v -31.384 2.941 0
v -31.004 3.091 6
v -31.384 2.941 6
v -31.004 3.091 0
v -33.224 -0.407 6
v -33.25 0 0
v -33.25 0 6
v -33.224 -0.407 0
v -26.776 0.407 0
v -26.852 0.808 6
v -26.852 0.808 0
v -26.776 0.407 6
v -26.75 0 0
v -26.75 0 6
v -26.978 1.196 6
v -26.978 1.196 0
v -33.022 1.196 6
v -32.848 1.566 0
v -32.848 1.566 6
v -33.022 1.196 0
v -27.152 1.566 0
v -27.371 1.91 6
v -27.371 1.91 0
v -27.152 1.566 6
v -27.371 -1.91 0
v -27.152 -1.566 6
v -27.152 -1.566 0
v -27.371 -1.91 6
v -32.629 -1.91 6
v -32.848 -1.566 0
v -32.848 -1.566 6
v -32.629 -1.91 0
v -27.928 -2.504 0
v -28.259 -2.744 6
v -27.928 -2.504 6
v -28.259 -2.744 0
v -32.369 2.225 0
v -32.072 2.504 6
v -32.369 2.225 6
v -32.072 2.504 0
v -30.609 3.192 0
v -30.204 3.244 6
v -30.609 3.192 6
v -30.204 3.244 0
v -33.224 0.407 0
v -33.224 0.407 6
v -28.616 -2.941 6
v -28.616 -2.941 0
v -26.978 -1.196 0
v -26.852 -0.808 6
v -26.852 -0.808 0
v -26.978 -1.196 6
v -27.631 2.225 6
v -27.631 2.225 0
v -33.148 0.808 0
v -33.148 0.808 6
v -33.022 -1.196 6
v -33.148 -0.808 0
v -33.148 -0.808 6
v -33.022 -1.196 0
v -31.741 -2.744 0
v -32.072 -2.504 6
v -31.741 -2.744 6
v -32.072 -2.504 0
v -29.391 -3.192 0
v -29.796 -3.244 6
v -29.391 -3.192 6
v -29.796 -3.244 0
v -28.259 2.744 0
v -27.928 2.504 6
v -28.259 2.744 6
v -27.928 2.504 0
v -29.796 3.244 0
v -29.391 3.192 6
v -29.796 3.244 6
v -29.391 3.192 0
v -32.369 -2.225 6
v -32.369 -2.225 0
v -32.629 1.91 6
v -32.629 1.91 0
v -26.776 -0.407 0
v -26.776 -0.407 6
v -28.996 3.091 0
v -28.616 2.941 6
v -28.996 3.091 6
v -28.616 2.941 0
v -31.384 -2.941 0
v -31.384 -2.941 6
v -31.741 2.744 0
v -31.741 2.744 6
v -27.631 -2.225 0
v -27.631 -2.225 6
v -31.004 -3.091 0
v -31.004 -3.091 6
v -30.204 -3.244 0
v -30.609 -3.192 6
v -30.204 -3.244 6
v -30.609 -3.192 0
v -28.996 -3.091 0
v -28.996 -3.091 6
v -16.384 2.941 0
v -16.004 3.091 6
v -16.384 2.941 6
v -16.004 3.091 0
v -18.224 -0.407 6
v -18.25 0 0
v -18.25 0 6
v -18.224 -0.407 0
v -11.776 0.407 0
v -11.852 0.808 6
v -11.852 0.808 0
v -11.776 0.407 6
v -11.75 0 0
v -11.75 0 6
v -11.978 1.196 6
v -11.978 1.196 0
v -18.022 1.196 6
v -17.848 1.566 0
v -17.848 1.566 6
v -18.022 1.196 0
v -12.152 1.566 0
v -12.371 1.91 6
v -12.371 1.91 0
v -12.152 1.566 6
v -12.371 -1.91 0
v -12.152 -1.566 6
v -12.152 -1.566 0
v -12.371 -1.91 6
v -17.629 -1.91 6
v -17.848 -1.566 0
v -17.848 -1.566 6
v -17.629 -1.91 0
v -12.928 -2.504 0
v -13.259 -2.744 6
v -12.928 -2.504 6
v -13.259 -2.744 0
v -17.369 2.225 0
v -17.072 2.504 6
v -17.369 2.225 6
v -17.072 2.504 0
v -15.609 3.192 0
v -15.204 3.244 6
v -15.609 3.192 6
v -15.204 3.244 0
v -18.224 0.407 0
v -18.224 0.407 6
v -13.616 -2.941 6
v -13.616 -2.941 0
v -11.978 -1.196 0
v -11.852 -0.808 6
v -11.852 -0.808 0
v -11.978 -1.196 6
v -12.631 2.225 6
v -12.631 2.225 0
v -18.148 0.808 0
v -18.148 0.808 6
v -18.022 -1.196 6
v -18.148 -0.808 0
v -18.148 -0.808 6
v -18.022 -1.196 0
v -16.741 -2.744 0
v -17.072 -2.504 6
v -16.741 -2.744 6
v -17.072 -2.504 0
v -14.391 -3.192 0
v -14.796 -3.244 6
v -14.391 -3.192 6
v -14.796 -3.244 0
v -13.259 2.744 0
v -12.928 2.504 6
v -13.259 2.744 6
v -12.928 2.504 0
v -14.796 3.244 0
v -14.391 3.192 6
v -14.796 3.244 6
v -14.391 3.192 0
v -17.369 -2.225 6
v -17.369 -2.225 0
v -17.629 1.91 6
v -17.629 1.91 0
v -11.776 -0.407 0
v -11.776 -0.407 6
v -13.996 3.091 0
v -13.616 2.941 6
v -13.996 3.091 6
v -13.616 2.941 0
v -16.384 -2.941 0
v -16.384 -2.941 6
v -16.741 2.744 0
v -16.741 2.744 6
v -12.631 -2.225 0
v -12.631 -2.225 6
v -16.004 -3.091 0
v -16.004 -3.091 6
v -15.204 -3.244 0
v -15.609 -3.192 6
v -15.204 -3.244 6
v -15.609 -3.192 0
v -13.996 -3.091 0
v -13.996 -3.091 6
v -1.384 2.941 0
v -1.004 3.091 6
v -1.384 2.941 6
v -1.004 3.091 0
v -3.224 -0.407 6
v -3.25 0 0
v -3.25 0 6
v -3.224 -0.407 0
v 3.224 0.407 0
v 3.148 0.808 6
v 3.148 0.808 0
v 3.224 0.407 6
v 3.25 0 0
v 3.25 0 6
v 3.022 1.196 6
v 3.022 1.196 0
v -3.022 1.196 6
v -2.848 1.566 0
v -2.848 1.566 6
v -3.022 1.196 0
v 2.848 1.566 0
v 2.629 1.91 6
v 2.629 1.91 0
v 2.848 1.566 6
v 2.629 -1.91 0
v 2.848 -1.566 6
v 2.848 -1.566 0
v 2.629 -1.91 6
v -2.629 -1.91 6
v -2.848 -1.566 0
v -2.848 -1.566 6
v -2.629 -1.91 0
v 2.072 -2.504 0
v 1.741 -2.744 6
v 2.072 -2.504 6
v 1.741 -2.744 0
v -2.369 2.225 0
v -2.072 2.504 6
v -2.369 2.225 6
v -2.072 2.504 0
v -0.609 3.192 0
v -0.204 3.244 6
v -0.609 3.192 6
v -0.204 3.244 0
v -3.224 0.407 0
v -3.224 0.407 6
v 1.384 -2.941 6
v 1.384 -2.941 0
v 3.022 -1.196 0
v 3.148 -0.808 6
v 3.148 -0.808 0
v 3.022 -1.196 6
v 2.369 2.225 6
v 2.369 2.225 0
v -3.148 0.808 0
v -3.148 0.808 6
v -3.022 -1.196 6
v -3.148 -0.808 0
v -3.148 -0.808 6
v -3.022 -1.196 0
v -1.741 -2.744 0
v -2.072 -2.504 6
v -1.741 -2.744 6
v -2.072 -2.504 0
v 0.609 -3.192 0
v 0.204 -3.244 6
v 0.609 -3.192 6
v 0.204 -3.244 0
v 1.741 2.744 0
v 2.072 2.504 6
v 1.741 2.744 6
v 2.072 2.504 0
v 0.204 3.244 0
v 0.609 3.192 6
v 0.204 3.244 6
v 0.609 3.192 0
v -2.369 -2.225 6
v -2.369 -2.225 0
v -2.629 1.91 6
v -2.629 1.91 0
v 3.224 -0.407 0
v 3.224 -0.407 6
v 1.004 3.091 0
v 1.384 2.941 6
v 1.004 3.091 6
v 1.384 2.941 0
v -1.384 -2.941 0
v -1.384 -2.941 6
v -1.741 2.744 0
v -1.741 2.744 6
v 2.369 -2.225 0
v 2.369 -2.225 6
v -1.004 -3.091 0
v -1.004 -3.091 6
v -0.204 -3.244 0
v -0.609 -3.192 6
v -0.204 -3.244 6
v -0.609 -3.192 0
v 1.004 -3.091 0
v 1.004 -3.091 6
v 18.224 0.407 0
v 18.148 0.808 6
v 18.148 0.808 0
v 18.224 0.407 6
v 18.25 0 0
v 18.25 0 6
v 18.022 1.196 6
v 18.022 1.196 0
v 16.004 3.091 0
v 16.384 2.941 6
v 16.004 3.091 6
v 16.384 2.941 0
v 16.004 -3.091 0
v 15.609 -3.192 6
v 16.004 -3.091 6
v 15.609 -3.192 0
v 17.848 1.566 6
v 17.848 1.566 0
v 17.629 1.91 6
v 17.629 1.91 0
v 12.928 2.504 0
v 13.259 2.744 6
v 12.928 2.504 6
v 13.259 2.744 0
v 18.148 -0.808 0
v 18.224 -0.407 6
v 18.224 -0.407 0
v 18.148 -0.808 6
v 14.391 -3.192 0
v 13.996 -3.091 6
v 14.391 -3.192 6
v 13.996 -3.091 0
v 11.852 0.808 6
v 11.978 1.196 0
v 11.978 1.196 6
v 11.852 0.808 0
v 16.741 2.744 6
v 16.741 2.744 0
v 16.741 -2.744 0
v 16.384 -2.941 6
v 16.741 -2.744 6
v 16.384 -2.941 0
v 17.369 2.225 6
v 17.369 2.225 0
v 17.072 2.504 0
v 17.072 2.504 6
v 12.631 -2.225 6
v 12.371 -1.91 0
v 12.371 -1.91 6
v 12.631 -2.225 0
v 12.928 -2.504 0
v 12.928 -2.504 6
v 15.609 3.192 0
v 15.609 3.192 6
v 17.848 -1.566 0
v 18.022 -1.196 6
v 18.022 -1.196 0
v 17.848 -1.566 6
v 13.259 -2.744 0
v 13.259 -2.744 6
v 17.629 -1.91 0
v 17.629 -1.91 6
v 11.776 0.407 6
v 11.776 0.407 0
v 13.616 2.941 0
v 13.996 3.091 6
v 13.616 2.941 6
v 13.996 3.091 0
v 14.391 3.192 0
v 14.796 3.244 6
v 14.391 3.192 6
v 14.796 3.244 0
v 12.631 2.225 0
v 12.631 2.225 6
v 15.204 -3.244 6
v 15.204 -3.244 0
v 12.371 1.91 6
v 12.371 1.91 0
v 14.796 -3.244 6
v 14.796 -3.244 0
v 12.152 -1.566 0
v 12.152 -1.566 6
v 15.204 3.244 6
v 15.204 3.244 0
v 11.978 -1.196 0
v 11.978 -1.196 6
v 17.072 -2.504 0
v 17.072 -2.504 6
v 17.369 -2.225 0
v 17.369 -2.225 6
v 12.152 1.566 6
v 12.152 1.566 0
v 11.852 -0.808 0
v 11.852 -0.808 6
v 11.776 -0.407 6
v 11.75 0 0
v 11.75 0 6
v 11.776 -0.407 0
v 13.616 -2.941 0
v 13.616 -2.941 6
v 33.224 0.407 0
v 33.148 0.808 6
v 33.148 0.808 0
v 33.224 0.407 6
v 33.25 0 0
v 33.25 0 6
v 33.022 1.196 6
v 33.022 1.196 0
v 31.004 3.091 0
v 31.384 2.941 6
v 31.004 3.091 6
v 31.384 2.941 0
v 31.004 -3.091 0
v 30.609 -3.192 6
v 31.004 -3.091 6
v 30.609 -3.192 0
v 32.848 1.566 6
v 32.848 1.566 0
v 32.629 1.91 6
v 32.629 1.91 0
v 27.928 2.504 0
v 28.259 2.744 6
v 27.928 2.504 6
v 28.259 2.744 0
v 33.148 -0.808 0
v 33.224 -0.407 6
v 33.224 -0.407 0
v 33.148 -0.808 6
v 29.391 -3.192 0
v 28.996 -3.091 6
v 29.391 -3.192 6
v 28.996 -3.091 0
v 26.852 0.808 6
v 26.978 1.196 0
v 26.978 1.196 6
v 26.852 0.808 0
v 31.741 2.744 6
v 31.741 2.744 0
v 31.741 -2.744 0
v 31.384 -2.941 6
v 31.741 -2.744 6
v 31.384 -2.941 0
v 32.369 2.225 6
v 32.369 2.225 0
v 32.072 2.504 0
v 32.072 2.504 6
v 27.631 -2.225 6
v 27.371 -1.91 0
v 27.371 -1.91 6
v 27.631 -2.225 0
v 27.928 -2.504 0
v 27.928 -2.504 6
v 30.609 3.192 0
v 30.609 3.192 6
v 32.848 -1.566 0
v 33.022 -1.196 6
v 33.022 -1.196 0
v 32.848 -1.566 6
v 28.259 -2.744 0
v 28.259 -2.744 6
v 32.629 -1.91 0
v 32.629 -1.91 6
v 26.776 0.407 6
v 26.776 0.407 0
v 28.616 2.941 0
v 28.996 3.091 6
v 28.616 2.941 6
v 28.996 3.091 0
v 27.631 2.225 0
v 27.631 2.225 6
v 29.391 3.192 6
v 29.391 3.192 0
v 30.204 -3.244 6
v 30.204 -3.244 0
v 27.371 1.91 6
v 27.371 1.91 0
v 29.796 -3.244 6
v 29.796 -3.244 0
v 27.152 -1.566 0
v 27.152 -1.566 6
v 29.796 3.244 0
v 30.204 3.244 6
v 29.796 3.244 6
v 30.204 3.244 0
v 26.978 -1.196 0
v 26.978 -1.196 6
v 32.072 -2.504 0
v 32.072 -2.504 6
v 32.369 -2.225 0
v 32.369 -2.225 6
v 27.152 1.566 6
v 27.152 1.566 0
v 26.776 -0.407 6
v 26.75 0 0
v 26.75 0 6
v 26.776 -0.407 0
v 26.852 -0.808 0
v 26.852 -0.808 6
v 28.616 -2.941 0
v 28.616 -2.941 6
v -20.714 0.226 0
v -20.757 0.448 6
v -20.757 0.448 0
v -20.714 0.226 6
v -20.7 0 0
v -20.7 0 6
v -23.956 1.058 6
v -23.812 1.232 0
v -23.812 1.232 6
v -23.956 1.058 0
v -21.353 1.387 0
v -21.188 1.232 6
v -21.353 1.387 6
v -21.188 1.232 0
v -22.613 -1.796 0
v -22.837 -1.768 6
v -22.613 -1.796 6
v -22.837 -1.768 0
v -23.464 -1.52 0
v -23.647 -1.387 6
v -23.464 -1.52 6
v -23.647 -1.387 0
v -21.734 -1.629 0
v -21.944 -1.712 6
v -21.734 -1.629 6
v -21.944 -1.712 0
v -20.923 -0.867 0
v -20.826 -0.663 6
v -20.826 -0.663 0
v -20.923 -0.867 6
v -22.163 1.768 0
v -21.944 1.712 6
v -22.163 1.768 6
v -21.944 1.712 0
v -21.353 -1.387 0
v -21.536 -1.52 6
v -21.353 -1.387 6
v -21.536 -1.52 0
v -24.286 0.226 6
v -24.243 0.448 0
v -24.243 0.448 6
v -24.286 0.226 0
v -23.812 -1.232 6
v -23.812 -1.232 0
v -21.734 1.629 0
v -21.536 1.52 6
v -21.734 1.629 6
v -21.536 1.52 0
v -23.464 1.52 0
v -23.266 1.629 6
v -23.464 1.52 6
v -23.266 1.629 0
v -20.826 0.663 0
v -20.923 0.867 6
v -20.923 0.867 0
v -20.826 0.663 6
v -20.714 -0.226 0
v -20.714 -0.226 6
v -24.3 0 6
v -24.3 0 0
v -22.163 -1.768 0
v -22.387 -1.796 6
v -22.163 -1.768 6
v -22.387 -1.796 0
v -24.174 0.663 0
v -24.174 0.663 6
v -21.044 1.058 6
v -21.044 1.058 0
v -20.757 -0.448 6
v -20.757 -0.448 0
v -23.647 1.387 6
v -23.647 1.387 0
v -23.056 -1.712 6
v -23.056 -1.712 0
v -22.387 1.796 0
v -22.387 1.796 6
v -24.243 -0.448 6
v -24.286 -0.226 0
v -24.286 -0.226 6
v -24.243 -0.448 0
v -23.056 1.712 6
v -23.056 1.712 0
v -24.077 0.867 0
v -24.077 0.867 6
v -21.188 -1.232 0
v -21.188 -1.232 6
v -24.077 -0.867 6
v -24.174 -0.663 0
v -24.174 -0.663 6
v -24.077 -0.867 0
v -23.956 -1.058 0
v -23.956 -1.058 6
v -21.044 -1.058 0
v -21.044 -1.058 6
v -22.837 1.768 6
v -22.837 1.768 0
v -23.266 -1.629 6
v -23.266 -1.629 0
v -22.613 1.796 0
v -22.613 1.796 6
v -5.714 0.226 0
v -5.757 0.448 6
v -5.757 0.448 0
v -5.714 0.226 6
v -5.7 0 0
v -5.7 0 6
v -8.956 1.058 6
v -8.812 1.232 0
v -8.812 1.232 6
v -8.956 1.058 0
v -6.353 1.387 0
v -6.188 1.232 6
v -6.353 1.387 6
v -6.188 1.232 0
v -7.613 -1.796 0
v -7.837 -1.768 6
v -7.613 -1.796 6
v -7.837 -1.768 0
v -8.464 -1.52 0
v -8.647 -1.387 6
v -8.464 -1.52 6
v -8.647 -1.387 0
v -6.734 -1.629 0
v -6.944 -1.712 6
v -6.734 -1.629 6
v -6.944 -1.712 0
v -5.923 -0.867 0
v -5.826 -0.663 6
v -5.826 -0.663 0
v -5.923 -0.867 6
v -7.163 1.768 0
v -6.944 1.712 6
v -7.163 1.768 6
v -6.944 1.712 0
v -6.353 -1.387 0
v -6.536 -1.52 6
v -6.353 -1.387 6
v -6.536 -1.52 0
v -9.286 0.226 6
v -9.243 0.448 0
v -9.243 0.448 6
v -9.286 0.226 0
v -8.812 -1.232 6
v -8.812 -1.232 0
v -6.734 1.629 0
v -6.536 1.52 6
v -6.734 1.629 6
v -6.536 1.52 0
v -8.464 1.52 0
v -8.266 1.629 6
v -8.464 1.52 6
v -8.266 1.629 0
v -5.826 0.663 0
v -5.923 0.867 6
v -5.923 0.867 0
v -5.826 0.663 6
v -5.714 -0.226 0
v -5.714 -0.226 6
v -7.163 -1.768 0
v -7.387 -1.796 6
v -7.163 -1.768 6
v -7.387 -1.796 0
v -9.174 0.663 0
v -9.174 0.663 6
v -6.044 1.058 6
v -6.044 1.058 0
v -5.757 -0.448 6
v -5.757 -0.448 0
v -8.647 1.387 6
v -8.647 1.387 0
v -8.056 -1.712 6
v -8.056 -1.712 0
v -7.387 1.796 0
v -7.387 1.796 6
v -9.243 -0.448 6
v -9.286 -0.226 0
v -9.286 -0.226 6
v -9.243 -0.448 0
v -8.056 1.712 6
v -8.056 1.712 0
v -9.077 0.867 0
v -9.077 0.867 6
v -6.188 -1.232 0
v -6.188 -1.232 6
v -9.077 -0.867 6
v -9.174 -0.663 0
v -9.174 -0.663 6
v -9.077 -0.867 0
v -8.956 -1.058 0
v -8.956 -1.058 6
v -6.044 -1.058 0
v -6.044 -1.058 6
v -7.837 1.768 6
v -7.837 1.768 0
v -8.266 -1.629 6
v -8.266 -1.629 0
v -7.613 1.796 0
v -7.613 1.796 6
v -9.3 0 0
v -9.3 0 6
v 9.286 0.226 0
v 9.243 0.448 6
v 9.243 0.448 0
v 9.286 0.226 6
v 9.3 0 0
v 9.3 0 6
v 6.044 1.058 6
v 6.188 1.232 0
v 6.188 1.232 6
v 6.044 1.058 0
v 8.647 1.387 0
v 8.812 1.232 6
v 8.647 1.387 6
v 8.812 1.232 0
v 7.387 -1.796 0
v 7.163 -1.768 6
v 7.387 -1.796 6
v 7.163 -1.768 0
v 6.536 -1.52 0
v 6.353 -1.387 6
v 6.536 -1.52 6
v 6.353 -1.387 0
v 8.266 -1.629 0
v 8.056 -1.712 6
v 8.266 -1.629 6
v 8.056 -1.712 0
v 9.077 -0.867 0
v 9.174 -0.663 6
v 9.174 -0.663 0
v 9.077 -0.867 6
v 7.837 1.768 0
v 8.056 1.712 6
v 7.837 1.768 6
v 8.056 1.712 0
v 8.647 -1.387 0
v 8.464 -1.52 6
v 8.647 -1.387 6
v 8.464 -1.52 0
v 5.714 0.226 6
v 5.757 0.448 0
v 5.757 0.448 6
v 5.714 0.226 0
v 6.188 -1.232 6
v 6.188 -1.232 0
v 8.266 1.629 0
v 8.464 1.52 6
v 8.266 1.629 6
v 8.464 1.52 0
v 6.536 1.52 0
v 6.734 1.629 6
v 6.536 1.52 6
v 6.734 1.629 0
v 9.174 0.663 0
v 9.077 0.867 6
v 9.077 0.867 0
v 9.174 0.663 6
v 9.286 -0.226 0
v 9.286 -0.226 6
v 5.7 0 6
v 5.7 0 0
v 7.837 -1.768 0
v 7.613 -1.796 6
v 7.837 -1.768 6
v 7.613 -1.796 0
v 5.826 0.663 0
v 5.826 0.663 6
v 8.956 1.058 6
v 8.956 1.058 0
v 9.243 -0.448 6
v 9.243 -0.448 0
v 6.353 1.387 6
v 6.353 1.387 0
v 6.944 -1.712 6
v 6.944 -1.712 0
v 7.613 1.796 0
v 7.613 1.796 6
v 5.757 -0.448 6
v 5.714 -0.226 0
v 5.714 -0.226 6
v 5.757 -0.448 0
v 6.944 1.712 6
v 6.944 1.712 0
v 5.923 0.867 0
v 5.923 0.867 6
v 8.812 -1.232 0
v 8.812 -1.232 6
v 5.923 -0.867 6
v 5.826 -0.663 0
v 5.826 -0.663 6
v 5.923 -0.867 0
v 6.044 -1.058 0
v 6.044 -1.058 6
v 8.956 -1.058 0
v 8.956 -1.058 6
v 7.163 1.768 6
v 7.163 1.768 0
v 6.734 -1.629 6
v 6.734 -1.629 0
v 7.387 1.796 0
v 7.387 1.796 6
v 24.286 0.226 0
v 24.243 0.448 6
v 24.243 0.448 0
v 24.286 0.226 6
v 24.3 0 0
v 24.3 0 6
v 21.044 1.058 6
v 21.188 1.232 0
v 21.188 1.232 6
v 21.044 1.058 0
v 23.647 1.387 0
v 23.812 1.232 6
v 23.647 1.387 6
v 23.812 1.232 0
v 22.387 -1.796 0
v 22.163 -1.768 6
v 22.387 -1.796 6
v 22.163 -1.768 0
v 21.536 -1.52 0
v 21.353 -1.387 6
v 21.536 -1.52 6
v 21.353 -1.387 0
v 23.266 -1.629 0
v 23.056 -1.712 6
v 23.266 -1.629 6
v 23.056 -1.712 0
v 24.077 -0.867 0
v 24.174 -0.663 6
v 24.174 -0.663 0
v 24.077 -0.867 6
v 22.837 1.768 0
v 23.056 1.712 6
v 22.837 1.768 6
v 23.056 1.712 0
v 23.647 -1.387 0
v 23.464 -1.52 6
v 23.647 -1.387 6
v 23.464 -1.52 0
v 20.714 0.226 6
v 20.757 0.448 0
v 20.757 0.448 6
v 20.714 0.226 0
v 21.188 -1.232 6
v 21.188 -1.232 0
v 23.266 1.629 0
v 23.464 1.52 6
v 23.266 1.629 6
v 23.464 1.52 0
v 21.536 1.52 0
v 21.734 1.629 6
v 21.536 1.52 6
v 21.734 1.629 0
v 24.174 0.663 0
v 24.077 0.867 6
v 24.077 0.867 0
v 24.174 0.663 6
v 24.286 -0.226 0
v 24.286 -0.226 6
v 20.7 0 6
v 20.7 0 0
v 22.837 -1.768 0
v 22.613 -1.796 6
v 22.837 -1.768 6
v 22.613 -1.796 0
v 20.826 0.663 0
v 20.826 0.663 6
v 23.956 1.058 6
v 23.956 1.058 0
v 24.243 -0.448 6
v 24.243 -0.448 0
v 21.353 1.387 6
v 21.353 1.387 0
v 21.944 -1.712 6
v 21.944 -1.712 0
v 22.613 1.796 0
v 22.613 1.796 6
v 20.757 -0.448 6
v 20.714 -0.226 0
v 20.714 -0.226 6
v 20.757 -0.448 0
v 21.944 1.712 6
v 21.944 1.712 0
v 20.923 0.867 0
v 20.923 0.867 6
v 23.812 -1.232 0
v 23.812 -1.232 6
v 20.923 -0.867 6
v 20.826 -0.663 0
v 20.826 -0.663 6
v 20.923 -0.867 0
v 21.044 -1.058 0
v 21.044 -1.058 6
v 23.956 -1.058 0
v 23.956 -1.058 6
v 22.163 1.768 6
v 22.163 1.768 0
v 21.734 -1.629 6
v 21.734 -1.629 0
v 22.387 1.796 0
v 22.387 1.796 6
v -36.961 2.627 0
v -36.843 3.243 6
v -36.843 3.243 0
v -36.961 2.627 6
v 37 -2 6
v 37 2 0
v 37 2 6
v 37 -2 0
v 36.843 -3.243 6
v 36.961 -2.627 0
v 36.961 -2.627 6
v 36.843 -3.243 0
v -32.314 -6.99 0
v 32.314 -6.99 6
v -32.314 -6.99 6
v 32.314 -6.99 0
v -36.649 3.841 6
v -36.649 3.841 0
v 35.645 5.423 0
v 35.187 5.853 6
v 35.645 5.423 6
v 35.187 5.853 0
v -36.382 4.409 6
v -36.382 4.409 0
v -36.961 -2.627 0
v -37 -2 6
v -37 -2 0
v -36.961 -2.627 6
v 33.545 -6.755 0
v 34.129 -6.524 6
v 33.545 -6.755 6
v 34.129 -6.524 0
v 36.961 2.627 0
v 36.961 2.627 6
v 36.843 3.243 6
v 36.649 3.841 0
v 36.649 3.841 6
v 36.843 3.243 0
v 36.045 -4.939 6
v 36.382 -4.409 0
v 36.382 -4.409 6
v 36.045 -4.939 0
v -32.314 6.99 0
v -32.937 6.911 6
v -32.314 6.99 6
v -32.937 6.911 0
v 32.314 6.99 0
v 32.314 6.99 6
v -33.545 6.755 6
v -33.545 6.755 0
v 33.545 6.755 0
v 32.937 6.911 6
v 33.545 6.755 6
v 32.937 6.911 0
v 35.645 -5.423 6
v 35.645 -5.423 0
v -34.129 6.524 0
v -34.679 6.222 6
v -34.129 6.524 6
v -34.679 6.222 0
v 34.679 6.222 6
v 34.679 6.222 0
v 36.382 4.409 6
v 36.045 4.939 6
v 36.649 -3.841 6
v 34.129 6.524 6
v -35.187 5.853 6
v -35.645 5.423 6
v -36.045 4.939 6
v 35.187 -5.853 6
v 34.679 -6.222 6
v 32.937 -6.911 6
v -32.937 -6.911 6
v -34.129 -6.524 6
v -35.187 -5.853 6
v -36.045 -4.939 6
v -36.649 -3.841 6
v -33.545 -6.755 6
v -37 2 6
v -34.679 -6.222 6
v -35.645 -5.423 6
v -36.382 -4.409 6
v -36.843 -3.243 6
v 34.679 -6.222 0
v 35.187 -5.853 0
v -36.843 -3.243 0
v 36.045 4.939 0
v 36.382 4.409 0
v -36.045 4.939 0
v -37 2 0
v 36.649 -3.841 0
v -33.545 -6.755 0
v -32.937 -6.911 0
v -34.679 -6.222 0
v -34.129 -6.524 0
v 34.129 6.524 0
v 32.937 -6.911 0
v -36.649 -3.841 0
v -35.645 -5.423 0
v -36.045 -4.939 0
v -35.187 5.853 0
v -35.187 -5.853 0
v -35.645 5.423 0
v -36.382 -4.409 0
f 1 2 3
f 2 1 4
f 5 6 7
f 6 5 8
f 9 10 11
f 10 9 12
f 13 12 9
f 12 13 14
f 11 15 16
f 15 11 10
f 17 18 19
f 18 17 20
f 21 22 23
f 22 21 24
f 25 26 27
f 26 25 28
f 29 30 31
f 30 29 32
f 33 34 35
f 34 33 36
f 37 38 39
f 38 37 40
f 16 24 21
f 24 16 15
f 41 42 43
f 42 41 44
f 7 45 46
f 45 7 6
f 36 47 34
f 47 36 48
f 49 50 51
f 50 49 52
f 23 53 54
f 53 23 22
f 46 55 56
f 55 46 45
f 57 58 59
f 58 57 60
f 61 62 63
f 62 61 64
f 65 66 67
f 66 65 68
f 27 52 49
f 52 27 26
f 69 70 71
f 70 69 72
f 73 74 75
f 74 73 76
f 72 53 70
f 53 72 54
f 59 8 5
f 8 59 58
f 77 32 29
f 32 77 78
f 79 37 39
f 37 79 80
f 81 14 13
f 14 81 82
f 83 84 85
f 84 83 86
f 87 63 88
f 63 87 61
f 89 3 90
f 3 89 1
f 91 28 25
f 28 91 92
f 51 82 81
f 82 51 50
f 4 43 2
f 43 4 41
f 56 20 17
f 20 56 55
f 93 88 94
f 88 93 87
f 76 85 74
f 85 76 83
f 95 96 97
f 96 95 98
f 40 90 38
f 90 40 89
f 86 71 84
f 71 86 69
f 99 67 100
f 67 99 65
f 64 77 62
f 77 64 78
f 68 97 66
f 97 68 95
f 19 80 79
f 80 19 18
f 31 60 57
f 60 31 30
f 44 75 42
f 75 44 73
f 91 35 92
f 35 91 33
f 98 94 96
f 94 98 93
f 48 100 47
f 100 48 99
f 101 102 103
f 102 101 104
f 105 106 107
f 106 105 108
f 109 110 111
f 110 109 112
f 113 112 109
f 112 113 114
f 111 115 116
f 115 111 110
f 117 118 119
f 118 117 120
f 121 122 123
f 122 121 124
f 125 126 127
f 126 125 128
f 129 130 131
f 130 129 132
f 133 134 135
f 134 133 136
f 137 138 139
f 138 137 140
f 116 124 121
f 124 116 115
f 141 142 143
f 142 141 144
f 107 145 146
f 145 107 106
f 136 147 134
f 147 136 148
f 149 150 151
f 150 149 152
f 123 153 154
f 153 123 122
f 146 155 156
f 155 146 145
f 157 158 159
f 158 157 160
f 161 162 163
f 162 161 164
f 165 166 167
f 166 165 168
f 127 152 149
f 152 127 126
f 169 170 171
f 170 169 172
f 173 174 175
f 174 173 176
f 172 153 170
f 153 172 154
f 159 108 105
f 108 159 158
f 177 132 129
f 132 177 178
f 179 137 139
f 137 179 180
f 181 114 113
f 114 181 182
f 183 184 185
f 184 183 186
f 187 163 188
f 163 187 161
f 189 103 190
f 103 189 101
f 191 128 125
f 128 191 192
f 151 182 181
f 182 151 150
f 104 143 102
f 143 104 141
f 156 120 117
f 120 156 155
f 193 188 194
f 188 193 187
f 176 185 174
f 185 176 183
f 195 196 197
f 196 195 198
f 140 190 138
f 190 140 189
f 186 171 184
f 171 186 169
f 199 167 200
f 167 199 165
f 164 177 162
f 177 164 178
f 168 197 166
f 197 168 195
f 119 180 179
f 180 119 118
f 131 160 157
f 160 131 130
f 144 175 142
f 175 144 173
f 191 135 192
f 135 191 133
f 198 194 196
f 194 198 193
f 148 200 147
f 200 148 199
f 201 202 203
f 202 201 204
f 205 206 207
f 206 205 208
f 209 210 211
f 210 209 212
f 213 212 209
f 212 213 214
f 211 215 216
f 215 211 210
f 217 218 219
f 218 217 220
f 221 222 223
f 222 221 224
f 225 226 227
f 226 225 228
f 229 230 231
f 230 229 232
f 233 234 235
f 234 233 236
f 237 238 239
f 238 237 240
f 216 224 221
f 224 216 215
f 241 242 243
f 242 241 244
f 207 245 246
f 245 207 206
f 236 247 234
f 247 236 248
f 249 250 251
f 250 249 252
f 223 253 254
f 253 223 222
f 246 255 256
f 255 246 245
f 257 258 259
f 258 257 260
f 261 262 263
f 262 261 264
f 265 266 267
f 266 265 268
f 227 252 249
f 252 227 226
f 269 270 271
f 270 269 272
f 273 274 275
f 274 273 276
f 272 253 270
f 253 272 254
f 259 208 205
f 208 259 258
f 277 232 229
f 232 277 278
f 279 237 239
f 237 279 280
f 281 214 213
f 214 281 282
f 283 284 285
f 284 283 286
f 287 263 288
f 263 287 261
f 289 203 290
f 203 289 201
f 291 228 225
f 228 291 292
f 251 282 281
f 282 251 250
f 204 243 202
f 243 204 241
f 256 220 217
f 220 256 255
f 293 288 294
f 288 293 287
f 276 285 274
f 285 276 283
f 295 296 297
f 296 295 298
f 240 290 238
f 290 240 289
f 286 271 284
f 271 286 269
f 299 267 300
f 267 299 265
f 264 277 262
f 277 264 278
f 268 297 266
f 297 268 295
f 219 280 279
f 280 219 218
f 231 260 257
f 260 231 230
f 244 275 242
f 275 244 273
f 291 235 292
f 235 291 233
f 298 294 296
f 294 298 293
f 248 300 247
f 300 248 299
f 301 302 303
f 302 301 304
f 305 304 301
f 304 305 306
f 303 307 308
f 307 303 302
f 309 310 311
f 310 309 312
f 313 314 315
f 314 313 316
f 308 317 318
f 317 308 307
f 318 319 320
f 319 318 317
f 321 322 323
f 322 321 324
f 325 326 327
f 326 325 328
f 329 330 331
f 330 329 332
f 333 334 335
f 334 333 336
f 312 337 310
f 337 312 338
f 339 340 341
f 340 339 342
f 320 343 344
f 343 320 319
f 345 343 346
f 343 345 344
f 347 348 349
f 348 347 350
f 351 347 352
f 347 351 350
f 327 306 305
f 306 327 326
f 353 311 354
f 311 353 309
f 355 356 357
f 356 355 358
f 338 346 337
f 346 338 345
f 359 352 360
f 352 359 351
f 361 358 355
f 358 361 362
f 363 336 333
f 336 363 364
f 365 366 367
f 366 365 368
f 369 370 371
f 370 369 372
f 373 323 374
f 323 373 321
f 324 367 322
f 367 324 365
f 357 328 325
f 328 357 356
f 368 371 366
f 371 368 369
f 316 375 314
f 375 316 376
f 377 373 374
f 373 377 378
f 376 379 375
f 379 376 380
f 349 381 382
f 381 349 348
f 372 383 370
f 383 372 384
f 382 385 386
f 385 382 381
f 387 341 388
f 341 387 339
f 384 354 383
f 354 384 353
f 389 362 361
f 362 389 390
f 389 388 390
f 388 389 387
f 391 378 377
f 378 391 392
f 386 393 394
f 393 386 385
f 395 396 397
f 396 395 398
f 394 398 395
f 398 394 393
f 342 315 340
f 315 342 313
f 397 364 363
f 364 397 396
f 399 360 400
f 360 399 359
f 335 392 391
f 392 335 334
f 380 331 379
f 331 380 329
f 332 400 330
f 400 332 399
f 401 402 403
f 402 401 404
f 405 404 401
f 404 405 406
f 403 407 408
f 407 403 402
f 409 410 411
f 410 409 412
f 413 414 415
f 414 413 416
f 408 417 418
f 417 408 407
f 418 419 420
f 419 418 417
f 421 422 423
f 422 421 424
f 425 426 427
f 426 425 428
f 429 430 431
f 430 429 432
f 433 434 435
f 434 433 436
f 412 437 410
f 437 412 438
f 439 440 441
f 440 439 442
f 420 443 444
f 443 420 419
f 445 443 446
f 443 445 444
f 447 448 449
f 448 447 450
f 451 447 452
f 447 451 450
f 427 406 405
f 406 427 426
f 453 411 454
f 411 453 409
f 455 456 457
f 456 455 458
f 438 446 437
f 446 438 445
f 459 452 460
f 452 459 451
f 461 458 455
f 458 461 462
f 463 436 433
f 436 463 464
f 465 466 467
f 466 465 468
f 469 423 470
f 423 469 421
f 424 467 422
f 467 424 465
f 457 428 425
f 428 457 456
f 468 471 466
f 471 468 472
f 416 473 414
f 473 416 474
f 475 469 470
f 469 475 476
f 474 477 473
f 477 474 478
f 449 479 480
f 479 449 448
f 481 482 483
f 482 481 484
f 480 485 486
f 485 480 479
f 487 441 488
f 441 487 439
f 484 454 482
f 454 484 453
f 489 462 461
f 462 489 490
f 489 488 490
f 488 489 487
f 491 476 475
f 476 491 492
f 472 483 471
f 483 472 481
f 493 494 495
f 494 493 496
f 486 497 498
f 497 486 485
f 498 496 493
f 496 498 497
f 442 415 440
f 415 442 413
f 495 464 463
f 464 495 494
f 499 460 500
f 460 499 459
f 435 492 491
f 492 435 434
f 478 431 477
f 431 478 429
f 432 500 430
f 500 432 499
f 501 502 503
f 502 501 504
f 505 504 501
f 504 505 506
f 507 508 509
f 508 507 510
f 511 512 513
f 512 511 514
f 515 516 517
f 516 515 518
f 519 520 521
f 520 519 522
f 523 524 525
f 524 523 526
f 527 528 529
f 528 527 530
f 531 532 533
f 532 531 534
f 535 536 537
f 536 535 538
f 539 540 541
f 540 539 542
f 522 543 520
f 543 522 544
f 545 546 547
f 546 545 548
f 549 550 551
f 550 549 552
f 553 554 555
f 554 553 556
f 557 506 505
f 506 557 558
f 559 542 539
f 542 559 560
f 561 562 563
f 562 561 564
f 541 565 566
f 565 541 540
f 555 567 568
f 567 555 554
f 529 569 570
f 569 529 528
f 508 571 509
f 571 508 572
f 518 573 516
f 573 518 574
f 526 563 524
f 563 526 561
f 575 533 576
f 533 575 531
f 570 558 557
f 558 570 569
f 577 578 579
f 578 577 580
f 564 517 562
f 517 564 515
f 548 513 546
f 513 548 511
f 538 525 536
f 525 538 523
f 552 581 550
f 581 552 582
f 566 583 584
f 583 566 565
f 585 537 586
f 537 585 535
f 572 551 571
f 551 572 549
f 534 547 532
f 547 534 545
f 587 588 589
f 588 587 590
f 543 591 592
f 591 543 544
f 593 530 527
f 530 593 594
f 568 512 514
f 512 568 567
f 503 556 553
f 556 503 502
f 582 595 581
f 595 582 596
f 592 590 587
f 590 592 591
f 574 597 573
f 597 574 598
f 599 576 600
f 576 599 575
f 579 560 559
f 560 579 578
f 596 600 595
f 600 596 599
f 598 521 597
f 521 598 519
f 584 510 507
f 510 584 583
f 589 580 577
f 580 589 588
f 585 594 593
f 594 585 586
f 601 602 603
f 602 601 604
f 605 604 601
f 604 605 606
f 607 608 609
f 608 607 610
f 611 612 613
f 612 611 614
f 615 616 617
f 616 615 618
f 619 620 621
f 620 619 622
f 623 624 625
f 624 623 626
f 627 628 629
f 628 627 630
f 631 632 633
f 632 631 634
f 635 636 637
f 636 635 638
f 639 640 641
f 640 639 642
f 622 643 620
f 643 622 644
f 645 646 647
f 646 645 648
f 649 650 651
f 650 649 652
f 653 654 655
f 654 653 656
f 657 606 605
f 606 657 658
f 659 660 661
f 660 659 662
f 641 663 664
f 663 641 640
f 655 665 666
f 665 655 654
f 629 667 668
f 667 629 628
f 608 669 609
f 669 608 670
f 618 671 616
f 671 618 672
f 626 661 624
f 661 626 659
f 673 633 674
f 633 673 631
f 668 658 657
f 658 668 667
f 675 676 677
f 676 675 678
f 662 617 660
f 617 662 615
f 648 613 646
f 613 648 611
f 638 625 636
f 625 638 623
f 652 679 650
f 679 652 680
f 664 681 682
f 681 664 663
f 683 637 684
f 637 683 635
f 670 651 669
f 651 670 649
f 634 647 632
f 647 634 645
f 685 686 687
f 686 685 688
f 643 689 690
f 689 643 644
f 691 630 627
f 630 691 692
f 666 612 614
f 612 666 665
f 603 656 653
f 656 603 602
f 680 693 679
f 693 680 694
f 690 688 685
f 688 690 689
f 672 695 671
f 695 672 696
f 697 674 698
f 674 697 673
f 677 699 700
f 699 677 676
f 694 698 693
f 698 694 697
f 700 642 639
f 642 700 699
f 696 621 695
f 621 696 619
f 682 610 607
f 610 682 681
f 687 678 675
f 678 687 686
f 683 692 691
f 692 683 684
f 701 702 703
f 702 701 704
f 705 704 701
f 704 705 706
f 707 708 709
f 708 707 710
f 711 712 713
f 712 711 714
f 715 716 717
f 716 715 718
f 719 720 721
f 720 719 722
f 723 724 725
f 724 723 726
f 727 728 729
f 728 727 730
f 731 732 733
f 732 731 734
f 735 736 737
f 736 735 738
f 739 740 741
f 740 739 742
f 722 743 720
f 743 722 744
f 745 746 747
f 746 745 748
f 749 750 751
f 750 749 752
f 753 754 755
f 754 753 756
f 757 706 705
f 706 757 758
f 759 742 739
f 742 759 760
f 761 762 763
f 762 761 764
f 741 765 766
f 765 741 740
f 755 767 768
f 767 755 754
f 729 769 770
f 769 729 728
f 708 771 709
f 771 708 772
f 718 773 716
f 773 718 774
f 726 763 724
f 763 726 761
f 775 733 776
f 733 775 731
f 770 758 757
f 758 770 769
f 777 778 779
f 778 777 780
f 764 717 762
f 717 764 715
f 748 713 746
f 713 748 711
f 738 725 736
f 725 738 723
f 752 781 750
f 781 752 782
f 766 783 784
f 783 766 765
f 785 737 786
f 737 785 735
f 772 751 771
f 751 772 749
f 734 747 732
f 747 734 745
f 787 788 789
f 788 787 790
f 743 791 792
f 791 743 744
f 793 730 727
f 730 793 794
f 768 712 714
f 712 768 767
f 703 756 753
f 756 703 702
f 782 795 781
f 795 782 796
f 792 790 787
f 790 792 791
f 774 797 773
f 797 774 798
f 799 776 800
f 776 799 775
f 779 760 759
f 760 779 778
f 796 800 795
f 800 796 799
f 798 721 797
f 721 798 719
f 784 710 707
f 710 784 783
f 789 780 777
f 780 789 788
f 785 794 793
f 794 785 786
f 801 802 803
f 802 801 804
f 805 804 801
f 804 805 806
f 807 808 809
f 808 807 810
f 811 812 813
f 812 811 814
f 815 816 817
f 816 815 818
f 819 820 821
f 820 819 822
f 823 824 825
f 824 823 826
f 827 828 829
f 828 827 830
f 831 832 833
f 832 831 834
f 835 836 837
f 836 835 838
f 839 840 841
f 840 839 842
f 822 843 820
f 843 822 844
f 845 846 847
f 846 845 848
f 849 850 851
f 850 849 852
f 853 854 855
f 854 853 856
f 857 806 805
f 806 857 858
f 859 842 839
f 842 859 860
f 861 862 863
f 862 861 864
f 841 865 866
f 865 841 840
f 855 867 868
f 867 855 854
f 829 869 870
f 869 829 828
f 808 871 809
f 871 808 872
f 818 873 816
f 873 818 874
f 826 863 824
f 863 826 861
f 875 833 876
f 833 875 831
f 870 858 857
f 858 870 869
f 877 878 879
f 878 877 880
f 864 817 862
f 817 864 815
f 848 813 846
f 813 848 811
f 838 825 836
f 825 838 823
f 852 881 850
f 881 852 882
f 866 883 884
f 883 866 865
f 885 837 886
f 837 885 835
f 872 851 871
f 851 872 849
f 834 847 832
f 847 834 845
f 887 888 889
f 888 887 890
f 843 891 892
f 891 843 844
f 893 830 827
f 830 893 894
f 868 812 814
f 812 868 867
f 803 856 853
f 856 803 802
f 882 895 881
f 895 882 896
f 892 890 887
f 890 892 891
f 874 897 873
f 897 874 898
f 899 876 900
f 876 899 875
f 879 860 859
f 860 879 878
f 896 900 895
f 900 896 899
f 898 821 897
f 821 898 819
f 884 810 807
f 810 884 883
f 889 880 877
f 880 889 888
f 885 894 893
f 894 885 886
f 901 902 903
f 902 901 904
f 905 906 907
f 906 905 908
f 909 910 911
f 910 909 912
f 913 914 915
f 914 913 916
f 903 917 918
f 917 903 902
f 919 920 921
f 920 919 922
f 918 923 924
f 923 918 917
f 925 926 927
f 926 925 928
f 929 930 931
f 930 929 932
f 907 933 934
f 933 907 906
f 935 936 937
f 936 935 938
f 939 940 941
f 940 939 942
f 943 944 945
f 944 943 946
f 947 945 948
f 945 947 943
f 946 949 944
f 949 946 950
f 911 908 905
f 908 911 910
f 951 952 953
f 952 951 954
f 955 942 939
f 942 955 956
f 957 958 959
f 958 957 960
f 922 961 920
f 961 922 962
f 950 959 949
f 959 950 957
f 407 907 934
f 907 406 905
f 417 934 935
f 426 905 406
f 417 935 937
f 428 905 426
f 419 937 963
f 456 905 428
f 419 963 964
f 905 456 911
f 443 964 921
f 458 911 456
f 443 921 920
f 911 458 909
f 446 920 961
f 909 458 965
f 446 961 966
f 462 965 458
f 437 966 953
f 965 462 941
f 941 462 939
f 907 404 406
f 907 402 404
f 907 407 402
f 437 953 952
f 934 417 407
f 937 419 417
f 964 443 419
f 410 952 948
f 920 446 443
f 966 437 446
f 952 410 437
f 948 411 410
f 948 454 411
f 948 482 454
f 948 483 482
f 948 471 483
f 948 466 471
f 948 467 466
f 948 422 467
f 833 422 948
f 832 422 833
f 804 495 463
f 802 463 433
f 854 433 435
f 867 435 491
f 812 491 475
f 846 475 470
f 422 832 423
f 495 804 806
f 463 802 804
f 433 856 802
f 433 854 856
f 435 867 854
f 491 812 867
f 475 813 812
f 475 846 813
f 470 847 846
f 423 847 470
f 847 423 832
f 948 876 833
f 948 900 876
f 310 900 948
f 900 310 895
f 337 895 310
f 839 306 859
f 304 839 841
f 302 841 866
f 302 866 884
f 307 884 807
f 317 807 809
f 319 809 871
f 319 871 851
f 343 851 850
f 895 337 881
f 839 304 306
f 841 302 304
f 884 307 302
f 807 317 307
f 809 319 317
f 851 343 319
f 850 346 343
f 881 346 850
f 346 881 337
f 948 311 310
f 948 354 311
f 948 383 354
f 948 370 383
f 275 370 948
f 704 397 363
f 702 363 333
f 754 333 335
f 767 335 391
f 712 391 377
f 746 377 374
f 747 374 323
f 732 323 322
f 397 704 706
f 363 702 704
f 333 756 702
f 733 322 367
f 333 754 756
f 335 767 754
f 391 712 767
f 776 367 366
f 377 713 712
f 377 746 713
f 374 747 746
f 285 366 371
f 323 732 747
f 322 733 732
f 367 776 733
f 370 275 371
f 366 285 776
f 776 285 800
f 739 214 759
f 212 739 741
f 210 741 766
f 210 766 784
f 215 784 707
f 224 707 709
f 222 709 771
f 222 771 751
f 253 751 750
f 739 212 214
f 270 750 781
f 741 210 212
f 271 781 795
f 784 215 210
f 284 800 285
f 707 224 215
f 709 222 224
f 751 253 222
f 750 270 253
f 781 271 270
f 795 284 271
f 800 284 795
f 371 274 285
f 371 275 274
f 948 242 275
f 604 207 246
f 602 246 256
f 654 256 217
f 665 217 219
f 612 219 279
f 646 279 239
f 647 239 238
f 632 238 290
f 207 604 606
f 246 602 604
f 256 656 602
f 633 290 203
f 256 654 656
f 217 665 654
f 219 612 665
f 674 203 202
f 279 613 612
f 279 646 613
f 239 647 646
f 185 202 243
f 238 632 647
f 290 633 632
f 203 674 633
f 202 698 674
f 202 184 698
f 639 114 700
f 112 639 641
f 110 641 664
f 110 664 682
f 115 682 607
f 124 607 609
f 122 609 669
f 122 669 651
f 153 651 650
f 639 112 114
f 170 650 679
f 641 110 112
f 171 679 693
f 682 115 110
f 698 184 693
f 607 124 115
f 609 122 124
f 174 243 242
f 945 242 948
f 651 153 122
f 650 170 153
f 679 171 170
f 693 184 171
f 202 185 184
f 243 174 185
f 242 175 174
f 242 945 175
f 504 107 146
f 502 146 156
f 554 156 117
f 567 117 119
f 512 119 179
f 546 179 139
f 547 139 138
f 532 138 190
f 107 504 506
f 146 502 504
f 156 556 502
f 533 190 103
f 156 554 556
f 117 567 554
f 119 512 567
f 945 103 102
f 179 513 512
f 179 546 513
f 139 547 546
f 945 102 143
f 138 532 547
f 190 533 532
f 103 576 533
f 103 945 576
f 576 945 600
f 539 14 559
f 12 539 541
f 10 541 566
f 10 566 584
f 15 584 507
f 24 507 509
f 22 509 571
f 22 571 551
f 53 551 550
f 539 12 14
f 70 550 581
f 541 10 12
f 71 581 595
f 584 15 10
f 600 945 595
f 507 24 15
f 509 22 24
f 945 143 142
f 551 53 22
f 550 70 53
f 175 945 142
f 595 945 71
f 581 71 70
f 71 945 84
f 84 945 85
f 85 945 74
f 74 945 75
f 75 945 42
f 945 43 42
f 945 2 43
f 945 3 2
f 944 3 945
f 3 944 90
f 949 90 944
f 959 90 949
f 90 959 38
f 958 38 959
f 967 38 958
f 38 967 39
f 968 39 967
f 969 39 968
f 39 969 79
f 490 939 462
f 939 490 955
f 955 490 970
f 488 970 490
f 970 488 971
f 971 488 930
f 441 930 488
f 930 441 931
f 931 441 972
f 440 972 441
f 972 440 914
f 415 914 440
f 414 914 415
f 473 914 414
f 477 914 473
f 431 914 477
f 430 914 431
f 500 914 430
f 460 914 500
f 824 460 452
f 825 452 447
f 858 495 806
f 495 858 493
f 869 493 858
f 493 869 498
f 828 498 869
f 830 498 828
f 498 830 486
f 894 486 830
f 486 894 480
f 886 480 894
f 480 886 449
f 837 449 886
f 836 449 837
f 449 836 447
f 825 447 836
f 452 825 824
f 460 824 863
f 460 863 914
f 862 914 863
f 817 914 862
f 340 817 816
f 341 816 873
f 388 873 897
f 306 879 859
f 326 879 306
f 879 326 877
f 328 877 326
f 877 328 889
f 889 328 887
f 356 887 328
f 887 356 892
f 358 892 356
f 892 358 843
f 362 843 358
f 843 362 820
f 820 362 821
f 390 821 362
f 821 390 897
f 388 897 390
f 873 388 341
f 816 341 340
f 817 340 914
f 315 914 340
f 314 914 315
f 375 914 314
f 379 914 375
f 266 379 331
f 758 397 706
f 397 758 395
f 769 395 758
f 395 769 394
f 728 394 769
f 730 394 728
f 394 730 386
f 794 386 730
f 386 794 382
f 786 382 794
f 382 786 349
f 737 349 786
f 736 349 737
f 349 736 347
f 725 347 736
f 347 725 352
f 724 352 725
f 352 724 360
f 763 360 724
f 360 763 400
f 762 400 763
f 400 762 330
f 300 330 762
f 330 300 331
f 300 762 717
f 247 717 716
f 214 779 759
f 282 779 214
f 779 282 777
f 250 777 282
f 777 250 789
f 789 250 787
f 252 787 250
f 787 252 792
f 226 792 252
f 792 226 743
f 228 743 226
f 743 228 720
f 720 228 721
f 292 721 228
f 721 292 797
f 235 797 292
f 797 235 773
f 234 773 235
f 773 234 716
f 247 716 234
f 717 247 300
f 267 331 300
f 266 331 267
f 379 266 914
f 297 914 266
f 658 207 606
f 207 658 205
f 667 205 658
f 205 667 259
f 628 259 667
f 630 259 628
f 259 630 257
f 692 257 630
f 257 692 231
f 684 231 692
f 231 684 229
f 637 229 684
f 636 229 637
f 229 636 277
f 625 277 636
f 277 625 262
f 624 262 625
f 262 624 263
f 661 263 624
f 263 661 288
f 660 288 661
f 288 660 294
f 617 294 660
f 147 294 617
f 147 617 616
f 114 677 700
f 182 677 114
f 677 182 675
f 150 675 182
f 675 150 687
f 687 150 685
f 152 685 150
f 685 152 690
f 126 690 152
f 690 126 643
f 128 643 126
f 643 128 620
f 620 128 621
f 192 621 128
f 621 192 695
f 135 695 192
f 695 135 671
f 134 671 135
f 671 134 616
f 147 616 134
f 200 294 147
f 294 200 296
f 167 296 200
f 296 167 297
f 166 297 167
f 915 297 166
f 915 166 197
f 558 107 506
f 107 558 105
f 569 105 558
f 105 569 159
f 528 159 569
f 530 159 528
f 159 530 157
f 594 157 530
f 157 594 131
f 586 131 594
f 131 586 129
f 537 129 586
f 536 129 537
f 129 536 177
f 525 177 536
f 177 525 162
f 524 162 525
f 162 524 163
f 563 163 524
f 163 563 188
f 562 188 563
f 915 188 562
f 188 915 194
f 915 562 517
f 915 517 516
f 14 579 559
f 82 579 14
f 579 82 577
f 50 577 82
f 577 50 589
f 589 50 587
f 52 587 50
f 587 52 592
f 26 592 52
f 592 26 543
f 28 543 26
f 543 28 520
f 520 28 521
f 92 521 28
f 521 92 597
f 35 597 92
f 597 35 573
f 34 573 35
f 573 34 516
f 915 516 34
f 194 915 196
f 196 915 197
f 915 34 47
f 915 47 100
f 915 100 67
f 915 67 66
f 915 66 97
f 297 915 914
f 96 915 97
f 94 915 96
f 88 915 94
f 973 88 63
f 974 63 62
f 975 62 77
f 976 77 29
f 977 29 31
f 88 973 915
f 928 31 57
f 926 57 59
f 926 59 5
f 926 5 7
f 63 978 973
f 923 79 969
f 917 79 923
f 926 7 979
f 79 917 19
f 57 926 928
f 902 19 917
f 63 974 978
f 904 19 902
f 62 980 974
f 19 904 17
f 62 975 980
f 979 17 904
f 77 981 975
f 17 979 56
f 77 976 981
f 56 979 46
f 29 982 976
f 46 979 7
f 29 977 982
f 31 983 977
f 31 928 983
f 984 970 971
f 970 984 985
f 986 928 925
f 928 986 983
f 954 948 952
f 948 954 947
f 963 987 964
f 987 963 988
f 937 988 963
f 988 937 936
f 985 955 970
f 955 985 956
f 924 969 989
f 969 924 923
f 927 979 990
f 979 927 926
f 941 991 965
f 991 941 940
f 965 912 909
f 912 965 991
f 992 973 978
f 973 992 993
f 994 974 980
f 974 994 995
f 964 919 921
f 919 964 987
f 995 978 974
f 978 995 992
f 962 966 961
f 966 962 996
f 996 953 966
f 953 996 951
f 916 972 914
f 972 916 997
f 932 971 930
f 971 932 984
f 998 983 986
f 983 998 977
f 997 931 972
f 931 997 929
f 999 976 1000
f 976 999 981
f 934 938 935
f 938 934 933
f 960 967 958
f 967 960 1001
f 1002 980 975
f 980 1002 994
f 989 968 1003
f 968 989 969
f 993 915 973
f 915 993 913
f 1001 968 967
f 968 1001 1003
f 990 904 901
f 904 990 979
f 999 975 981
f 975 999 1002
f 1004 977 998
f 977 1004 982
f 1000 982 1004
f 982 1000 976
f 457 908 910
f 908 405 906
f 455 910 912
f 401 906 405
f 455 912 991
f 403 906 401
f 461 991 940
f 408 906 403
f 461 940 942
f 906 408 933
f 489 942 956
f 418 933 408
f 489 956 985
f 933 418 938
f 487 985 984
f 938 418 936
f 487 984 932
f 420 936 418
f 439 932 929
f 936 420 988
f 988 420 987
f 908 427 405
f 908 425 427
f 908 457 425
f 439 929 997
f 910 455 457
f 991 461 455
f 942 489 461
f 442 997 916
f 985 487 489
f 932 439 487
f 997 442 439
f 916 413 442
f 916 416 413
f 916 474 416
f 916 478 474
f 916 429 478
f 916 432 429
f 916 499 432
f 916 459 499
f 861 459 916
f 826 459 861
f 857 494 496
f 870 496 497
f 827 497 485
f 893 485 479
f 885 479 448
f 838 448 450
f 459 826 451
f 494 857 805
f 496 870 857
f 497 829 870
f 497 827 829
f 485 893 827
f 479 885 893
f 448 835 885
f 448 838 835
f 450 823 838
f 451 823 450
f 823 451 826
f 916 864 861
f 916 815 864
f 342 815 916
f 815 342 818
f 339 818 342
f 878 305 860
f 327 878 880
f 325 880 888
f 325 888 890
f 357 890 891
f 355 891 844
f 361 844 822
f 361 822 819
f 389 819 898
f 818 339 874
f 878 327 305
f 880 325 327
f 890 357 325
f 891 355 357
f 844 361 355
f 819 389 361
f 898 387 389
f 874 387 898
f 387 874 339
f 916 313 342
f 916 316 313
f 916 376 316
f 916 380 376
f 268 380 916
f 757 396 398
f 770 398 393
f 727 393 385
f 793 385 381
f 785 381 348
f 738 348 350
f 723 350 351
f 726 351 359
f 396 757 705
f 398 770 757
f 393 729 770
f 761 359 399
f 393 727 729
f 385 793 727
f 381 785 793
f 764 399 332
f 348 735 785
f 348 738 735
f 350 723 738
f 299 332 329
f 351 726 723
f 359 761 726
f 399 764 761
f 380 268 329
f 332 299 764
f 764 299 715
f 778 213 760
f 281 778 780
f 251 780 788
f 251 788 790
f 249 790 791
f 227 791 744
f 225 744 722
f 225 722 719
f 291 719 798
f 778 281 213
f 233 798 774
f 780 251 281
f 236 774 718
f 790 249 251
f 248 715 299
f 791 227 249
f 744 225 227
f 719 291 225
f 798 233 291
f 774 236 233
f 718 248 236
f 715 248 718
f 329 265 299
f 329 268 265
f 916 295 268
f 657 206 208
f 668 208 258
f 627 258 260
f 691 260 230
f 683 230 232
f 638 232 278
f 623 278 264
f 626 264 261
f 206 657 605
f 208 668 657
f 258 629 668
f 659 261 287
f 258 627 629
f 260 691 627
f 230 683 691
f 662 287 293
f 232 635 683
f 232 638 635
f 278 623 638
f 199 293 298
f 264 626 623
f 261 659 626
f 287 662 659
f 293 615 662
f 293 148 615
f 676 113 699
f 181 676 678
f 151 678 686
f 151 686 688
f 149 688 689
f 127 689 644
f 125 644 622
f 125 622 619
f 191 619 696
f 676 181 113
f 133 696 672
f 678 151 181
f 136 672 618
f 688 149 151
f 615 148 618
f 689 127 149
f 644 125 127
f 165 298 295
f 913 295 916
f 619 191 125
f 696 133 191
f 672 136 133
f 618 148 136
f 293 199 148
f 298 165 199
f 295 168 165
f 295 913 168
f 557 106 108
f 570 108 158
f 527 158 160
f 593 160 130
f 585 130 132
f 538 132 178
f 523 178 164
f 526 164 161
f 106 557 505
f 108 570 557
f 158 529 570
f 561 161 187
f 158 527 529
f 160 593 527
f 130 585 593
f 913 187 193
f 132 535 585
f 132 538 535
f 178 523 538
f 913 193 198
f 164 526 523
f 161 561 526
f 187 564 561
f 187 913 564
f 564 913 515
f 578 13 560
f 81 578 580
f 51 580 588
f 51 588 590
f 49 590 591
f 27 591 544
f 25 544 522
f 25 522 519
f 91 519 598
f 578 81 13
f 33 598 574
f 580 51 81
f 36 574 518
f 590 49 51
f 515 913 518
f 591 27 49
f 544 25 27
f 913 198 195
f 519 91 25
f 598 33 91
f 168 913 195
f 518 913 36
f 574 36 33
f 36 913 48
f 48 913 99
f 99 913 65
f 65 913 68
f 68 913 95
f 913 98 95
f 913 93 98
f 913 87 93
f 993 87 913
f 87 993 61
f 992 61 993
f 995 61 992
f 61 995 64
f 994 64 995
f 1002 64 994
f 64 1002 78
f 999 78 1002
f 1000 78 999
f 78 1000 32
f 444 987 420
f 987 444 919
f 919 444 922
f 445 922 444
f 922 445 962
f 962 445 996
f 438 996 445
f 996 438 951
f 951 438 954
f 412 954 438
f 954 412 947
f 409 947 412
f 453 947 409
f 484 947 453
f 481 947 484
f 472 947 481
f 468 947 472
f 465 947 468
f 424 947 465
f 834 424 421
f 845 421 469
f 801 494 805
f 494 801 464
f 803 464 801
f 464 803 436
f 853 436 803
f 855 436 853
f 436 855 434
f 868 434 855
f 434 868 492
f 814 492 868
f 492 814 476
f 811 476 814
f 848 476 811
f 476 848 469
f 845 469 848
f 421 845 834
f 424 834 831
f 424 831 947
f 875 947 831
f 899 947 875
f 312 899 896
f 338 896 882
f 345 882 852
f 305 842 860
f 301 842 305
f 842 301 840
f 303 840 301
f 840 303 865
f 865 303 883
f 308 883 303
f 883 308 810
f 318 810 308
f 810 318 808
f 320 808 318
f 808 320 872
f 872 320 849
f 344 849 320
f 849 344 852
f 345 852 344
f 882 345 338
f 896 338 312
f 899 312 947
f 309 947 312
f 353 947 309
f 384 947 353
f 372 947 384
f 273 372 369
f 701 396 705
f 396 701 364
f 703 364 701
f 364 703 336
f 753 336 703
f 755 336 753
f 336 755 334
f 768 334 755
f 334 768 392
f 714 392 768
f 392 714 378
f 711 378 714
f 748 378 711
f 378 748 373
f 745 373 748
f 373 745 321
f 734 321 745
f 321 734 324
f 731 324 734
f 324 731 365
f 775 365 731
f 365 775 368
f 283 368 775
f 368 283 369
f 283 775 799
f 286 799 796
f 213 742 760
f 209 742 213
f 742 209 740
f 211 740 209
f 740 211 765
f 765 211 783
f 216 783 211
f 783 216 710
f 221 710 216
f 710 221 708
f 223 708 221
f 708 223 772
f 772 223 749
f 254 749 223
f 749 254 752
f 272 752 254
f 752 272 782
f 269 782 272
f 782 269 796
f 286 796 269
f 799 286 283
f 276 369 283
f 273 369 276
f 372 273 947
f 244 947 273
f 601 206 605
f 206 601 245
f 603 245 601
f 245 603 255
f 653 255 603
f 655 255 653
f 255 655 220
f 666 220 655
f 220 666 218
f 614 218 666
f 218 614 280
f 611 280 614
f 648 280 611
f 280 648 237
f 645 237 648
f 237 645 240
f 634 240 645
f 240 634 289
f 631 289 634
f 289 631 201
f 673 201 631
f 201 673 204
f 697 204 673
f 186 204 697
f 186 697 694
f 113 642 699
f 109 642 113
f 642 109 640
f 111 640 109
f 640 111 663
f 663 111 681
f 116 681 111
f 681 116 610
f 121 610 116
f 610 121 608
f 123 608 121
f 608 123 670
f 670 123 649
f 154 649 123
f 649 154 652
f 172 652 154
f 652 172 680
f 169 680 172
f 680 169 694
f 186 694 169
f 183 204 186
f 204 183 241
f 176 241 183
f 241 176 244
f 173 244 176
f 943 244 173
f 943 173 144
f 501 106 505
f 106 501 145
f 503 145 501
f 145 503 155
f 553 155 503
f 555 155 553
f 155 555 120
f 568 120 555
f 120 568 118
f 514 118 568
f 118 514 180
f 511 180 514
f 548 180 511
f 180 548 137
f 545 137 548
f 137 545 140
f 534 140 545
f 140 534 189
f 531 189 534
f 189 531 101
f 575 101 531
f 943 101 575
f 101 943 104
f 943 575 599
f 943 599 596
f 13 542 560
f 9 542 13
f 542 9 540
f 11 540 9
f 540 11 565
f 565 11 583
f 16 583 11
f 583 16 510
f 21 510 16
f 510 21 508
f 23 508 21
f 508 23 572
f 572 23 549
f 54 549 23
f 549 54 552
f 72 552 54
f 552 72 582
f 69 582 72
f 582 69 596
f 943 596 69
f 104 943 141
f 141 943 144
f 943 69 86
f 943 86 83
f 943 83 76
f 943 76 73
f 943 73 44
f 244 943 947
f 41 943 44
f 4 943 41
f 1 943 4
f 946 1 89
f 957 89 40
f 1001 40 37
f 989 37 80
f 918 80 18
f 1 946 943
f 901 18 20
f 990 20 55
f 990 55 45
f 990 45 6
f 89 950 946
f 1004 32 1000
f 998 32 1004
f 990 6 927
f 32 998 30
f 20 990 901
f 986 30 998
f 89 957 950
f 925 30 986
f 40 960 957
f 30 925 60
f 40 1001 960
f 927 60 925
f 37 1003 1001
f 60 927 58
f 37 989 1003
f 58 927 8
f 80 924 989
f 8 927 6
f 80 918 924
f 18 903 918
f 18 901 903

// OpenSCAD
$fn = 50;


difference() {
	union() {
		hull() {
			translate(v = [-32.0000000000, 2.0000000000, 0]) {
				cylinder(h = 6, r = 5);
			}
			translate(v = [32.0000000000, 2.0000000000, 0]) {
				cylinder(h = 6, r = 5);
			}
			translate(v = [-32.0000000000, -2.0000000000, 0]) {
				cylinder(h = 6, r = 5);
			}
			translate(v = [32.0000000000, -2.0000000000, 0]) {
				cylinder(h = 6, r = 5);
			}
		}
	}
	union() {
		translate(v = [-30.0000000000, 0.0000000000, 0]) {
			translate(v = [0, 0, -100]) {
				cylinder(h = 200, r = 3.2500000000);
			}
		}
		translate(v = [-15.0000000000, 0.0000000000, 0]) {
			translate(v = [0, 0, -100]) {
				cylinder(h = 200, r = 3.2500000000);
			}
		}
		translate(v = [0, 0, -100]) {
			cylinder(h = 200, r = 3.2500000000);
		}
		translate(v = [15.0000000000, 0.0000000000, 0]) {
			translate(v = [0, 0, -100]) {
				cylinder(h = 200, r = 3.2500000000);
			}
		}
		translate(v = [30.0000000000, 0.0000000000, 0]) {
			translate(v = [0, 0, -100]) {
				cylinder(h = 200, r = 3.2500000000);
			}
		}
		translate(v = [-30.0000000000, 0.0000000000, 0]) {
			translate(v = [0, 0, -100]) {
				cylinder(h = 200, r = 1.8000000000);
			}
		}
		translate(v = [-22.5000000000, 0.0000000000, 0]) {
			translate(v = [0, 0, -100]) {
				cylinder(h = 200, r = 1.8000000000);
			}
		}
		translate(v = [-15.0000000000, 0.0000000000, 0]) {
			translate(v = [0, 0, -100]) {
				cylinder(h = 200, r = 1.8000000000);
			}
		}
		translate(v = [-7.5000000000, 0.0000000000, 0]) {
			translate(v = [0, 0, -100]) {
				cylinder(h = 200, r = 1.8000000000);
			}
		}
		translate(v = [0, 0, -100]) {
			cylinder(h = 200, r = 1.8000000000);
		}
		translate(v = [7.5000000000, 0.0000000000, 0]) {
			translate(v = [0, 0, -100]) {
				cylinder(h = 200, r = 1.8000000000);
			}
		}
		translate(v = [15.0000000000, 0.0000000000, 0]) {
			translate(v = [0, 0, -100]) {
				cylinder(h = 200, r = 1.8000000000);
			}
		}
		translate(v = [22.5000000000, 0.0000000000, 0]) {
			translate(v = [0, 0, -100]) {
				cylinder(h = 200, r = 1.8000000000);
			}
		}
		translate(v = [30.0000000000, 0.0000000000, 0]) {
			translate(v = [0, 0, -100]) {
				cylinder(h = 200, r = 1.8000000000);
			}
		}
	}
}
